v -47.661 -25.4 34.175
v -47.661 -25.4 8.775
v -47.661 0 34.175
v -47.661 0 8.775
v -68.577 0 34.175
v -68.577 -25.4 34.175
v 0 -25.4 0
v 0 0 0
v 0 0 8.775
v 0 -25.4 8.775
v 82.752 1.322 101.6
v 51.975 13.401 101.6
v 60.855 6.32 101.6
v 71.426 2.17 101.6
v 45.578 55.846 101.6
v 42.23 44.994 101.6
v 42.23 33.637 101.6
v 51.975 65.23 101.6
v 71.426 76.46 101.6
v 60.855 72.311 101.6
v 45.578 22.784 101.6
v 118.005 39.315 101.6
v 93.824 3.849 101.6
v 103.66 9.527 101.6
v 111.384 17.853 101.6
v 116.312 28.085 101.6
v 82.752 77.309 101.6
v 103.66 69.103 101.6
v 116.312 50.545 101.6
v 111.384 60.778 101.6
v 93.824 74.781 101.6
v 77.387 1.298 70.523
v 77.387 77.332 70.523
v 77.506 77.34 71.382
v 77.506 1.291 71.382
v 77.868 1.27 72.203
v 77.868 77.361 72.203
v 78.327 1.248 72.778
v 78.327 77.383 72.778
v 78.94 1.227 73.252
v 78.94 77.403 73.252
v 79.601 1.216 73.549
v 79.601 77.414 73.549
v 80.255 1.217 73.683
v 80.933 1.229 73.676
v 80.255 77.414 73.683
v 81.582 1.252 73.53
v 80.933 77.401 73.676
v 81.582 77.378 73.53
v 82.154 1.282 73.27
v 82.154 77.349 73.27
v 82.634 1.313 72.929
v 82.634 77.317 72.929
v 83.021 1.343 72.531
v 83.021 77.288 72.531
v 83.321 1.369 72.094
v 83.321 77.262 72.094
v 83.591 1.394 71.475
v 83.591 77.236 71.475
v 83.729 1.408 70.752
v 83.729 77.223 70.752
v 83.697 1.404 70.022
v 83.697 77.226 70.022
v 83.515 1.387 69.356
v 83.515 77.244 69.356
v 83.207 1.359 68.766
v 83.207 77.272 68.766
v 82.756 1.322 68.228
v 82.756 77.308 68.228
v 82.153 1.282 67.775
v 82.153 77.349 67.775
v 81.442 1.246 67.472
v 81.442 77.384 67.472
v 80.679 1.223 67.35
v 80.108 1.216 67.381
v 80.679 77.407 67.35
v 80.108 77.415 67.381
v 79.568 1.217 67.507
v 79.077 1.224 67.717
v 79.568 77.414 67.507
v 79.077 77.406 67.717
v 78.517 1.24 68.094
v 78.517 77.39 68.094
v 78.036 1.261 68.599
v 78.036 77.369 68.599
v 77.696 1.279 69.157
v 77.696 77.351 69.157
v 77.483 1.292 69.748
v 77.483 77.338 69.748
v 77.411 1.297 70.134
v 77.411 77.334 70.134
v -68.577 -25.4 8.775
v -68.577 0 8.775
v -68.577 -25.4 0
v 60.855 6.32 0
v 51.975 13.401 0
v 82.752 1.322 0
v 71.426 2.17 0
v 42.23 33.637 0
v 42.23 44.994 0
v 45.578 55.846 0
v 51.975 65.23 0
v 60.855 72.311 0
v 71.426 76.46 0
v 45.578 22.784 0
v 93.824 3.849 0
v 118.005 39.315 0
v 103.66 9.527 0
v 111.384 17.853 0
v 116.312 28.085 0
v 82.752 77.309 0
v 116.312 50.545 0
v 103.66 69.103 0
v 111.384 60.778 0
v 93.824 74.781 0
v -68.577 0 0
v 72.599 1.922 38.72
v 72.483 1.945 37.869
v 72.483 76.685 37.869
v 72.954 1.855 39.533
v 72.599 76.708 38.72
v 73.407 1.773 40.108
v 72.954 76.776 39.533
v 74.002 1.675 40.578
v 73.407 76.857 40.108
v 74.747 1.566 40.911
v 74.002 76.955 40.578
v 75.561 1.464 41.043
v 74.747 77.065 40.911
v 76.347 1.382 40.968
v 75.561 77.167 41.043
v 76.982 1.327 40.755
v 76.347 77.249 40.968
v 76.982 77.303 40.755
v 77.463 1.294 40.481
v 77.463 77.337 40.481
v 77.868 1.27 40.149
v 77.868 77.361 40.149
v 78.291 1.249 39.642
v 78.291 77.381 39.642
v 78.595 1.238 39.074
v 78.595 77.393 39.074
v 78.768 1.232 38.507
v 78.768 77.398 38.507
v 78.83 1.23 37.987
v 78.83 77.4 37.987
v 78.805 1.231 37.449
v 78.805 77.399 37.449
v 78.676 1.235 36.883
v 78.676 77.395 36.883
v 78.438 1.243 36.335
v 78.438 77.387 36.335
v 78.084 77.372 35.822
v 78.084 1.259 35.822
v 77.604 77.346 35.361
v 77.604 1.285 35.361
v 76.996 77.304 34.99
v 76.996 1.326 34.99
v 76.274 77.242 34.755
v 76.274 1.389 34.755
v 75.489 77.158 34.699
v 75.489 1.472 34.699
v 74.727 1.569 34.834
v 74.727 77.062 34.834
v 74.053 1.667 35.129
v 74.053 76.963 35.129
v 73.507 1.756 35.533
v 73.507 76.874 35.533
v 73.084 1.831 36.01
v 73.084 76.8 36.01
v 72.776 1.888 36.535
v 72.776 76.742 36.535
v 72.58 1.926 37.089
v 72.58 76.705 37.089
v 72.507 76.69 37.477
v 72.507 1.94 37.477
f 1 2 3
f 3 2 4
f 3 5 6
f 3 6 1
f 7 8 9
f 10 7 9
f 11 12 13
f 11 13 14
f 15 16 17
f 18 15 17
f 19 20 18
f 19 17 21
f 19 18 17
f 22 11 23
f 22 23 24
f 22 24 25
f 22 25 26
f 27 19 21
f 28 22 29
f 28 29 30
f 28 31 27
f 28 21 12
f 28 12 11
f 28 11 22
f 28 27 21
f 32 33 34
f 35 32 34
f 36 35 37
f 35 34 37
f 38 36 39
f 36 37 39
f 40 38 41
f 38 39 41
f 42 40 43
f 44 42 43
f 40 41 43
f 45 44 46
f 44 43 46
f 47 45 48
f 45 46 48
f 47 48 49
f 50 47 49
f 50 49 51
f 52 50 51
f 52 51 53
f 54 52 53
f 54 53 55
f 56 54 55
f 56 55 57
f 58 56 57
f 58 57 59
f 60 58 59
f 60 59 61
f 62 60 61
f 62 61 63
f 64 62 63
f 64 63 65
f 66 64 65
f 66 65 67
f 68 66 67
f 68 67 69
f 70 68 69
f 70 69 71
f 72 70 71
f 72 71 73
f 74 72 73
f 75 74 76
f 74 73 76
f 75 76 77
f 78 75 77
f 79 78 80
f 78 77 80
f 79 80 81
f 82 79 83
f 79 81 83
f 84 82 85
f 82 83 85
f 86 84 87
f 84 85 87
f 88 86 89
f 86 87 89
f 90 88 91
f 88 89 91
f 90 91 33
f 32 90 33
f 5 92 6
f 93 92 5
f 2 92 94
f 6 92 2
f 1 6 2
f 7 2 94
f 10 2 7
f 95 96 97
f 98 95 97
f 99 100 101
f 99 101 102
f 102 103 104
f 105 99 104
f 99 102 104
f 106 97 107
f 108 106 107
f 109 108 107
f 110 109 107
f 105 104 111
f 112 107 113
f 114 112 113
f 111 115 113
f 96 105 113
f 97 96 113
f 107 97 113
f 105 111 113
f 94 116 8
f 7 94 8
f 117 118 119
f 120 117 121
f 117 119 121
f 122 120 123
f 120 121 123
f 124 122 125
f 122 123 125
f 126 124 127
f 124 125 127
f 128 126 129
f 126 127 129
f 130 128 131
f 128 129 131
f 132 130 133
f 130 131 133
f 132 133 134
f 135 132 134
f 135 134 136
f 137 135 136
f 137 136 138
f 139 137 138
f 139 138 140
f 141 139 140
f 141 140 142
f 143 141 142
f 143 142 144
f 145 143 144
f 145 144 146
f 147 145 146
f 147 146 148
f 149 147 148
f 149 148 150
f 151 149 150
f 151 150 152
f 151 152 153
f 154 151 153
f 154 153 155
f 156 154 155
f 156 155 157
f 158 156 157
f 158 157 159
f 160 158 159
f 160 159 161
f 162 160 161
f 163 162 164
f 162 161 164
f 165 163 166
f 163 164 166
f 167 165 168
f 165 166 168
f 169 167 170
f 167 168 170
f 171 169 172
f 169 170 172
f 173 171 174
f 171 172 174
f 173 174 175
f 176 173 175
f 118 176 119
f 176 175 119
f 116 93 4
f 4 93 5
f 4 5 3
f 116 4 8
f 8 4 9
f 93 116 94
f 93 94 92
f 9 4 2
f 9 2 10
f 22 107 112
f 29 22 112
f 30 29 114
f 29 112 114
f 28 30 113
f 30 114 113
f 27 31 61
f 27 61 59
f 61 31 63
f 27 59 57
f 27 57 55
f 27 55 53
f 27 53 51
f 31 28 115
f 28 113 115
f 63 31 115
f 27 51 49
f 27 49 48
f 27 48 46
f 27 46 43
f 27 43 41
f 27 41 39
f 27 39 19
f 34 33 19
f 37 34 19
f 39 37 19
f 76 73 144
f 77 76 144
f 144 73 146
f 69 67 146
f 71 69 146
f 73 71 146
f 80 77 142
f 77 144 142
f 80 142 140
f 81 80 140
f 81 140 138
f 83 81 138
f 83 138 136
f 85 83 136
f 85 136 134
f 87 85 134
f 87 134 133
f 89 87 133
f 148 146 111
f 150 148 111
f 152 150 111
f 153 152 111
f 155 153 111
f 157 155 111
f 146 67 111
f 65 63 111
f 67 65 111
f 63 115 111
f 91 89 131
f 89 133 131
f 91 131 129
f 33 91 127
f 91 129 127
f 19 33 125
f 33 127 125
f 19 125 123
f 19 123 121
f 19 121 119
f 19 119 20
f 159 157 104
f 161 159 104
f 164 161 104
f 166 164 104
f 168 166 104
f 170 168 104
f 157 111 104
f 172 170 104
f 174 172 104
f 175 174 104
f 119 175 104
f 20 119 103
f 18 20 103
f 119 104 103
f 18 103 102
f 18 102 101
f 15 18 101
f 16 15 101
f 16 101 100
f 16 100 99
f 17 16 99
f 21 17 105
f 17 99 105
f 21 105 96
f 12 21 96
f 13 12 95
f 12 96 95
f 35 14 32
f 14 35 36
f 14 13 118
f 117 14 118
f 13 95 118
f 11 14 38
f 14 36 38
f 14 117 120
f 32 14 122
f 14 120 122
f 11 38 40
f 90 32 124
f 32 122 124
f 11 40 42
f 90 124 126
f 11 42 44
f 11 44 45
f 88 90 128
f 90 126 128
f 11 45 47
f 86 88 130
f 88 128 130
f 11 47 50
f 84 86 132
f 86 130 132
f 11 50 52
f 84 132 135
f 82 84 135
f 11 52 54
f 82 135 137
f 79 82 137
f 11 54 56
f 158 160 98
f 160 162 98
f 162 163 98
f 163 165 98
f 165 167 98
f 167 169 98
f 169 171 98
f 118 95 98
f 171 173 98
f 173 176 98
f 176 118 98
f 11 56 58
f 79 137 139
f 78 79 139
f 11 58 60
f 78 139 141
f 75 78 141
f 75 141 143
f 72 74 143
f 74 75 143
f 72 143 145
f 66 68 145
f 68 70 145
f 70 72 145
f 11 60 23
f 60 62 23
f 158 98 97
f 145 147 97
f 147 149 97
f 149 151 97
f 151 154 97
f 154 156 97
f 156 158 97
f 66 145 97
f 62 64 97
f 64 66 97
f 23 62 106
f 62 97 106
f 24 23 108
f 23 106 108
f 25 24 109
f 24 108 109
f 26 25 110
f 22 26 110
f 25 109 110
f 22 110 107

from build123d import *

# Parameters (mm, degrees)
F0_W     = 68.577282
F0_H     = 8.77474
F1_DEPTH = 25.4
F2_W     = 20.915847
F2_H     = 25.4
F3_DEPTH = 25.4
F4_R     = 38.1
F5_DEPTH = 101.6
F7_D     = 6.35
F9_D     = 6.35


with BuildPart() as f1:
    # F0 (on Front) → F1 (new body)
    with BuildSketch(Plane.XZ):
        with Locations((-34.288641, 4.38737)):
            Rectangle(F0_W, F0_H)
    extrude(amount=F1_DEPTH)

    # F2 (on face) → F3 (join)
    with BuildSketch(Plane.XY.offset(8.77474)):
        with Locations((-58.119358, -12.7)):
            Rectangle(F2_W, F2_H)
    extrude(amount=F3_DEPTH)


with BuildPart() as f5:
    # F4 (on Top) → F5 (new body)
    with BuildSketch(Plane.XY):
        with Locations((79.904541, 39.315209)):
            Circle(F4_R)
    extrude(amount=F5_DEPTH)

    # F7 (through all)
    with Locations(Plane.XZ):
        with Locations((80.562241, 70.522875)):
            Hole(F7_D / 2)

    # F9 (through all)
    with Locations(Plane.XZ):
        with Locations((75.657621, 37.869122)):
            Hole(F9_D / 2)


solid = Compound([f1.part, f5.part])
